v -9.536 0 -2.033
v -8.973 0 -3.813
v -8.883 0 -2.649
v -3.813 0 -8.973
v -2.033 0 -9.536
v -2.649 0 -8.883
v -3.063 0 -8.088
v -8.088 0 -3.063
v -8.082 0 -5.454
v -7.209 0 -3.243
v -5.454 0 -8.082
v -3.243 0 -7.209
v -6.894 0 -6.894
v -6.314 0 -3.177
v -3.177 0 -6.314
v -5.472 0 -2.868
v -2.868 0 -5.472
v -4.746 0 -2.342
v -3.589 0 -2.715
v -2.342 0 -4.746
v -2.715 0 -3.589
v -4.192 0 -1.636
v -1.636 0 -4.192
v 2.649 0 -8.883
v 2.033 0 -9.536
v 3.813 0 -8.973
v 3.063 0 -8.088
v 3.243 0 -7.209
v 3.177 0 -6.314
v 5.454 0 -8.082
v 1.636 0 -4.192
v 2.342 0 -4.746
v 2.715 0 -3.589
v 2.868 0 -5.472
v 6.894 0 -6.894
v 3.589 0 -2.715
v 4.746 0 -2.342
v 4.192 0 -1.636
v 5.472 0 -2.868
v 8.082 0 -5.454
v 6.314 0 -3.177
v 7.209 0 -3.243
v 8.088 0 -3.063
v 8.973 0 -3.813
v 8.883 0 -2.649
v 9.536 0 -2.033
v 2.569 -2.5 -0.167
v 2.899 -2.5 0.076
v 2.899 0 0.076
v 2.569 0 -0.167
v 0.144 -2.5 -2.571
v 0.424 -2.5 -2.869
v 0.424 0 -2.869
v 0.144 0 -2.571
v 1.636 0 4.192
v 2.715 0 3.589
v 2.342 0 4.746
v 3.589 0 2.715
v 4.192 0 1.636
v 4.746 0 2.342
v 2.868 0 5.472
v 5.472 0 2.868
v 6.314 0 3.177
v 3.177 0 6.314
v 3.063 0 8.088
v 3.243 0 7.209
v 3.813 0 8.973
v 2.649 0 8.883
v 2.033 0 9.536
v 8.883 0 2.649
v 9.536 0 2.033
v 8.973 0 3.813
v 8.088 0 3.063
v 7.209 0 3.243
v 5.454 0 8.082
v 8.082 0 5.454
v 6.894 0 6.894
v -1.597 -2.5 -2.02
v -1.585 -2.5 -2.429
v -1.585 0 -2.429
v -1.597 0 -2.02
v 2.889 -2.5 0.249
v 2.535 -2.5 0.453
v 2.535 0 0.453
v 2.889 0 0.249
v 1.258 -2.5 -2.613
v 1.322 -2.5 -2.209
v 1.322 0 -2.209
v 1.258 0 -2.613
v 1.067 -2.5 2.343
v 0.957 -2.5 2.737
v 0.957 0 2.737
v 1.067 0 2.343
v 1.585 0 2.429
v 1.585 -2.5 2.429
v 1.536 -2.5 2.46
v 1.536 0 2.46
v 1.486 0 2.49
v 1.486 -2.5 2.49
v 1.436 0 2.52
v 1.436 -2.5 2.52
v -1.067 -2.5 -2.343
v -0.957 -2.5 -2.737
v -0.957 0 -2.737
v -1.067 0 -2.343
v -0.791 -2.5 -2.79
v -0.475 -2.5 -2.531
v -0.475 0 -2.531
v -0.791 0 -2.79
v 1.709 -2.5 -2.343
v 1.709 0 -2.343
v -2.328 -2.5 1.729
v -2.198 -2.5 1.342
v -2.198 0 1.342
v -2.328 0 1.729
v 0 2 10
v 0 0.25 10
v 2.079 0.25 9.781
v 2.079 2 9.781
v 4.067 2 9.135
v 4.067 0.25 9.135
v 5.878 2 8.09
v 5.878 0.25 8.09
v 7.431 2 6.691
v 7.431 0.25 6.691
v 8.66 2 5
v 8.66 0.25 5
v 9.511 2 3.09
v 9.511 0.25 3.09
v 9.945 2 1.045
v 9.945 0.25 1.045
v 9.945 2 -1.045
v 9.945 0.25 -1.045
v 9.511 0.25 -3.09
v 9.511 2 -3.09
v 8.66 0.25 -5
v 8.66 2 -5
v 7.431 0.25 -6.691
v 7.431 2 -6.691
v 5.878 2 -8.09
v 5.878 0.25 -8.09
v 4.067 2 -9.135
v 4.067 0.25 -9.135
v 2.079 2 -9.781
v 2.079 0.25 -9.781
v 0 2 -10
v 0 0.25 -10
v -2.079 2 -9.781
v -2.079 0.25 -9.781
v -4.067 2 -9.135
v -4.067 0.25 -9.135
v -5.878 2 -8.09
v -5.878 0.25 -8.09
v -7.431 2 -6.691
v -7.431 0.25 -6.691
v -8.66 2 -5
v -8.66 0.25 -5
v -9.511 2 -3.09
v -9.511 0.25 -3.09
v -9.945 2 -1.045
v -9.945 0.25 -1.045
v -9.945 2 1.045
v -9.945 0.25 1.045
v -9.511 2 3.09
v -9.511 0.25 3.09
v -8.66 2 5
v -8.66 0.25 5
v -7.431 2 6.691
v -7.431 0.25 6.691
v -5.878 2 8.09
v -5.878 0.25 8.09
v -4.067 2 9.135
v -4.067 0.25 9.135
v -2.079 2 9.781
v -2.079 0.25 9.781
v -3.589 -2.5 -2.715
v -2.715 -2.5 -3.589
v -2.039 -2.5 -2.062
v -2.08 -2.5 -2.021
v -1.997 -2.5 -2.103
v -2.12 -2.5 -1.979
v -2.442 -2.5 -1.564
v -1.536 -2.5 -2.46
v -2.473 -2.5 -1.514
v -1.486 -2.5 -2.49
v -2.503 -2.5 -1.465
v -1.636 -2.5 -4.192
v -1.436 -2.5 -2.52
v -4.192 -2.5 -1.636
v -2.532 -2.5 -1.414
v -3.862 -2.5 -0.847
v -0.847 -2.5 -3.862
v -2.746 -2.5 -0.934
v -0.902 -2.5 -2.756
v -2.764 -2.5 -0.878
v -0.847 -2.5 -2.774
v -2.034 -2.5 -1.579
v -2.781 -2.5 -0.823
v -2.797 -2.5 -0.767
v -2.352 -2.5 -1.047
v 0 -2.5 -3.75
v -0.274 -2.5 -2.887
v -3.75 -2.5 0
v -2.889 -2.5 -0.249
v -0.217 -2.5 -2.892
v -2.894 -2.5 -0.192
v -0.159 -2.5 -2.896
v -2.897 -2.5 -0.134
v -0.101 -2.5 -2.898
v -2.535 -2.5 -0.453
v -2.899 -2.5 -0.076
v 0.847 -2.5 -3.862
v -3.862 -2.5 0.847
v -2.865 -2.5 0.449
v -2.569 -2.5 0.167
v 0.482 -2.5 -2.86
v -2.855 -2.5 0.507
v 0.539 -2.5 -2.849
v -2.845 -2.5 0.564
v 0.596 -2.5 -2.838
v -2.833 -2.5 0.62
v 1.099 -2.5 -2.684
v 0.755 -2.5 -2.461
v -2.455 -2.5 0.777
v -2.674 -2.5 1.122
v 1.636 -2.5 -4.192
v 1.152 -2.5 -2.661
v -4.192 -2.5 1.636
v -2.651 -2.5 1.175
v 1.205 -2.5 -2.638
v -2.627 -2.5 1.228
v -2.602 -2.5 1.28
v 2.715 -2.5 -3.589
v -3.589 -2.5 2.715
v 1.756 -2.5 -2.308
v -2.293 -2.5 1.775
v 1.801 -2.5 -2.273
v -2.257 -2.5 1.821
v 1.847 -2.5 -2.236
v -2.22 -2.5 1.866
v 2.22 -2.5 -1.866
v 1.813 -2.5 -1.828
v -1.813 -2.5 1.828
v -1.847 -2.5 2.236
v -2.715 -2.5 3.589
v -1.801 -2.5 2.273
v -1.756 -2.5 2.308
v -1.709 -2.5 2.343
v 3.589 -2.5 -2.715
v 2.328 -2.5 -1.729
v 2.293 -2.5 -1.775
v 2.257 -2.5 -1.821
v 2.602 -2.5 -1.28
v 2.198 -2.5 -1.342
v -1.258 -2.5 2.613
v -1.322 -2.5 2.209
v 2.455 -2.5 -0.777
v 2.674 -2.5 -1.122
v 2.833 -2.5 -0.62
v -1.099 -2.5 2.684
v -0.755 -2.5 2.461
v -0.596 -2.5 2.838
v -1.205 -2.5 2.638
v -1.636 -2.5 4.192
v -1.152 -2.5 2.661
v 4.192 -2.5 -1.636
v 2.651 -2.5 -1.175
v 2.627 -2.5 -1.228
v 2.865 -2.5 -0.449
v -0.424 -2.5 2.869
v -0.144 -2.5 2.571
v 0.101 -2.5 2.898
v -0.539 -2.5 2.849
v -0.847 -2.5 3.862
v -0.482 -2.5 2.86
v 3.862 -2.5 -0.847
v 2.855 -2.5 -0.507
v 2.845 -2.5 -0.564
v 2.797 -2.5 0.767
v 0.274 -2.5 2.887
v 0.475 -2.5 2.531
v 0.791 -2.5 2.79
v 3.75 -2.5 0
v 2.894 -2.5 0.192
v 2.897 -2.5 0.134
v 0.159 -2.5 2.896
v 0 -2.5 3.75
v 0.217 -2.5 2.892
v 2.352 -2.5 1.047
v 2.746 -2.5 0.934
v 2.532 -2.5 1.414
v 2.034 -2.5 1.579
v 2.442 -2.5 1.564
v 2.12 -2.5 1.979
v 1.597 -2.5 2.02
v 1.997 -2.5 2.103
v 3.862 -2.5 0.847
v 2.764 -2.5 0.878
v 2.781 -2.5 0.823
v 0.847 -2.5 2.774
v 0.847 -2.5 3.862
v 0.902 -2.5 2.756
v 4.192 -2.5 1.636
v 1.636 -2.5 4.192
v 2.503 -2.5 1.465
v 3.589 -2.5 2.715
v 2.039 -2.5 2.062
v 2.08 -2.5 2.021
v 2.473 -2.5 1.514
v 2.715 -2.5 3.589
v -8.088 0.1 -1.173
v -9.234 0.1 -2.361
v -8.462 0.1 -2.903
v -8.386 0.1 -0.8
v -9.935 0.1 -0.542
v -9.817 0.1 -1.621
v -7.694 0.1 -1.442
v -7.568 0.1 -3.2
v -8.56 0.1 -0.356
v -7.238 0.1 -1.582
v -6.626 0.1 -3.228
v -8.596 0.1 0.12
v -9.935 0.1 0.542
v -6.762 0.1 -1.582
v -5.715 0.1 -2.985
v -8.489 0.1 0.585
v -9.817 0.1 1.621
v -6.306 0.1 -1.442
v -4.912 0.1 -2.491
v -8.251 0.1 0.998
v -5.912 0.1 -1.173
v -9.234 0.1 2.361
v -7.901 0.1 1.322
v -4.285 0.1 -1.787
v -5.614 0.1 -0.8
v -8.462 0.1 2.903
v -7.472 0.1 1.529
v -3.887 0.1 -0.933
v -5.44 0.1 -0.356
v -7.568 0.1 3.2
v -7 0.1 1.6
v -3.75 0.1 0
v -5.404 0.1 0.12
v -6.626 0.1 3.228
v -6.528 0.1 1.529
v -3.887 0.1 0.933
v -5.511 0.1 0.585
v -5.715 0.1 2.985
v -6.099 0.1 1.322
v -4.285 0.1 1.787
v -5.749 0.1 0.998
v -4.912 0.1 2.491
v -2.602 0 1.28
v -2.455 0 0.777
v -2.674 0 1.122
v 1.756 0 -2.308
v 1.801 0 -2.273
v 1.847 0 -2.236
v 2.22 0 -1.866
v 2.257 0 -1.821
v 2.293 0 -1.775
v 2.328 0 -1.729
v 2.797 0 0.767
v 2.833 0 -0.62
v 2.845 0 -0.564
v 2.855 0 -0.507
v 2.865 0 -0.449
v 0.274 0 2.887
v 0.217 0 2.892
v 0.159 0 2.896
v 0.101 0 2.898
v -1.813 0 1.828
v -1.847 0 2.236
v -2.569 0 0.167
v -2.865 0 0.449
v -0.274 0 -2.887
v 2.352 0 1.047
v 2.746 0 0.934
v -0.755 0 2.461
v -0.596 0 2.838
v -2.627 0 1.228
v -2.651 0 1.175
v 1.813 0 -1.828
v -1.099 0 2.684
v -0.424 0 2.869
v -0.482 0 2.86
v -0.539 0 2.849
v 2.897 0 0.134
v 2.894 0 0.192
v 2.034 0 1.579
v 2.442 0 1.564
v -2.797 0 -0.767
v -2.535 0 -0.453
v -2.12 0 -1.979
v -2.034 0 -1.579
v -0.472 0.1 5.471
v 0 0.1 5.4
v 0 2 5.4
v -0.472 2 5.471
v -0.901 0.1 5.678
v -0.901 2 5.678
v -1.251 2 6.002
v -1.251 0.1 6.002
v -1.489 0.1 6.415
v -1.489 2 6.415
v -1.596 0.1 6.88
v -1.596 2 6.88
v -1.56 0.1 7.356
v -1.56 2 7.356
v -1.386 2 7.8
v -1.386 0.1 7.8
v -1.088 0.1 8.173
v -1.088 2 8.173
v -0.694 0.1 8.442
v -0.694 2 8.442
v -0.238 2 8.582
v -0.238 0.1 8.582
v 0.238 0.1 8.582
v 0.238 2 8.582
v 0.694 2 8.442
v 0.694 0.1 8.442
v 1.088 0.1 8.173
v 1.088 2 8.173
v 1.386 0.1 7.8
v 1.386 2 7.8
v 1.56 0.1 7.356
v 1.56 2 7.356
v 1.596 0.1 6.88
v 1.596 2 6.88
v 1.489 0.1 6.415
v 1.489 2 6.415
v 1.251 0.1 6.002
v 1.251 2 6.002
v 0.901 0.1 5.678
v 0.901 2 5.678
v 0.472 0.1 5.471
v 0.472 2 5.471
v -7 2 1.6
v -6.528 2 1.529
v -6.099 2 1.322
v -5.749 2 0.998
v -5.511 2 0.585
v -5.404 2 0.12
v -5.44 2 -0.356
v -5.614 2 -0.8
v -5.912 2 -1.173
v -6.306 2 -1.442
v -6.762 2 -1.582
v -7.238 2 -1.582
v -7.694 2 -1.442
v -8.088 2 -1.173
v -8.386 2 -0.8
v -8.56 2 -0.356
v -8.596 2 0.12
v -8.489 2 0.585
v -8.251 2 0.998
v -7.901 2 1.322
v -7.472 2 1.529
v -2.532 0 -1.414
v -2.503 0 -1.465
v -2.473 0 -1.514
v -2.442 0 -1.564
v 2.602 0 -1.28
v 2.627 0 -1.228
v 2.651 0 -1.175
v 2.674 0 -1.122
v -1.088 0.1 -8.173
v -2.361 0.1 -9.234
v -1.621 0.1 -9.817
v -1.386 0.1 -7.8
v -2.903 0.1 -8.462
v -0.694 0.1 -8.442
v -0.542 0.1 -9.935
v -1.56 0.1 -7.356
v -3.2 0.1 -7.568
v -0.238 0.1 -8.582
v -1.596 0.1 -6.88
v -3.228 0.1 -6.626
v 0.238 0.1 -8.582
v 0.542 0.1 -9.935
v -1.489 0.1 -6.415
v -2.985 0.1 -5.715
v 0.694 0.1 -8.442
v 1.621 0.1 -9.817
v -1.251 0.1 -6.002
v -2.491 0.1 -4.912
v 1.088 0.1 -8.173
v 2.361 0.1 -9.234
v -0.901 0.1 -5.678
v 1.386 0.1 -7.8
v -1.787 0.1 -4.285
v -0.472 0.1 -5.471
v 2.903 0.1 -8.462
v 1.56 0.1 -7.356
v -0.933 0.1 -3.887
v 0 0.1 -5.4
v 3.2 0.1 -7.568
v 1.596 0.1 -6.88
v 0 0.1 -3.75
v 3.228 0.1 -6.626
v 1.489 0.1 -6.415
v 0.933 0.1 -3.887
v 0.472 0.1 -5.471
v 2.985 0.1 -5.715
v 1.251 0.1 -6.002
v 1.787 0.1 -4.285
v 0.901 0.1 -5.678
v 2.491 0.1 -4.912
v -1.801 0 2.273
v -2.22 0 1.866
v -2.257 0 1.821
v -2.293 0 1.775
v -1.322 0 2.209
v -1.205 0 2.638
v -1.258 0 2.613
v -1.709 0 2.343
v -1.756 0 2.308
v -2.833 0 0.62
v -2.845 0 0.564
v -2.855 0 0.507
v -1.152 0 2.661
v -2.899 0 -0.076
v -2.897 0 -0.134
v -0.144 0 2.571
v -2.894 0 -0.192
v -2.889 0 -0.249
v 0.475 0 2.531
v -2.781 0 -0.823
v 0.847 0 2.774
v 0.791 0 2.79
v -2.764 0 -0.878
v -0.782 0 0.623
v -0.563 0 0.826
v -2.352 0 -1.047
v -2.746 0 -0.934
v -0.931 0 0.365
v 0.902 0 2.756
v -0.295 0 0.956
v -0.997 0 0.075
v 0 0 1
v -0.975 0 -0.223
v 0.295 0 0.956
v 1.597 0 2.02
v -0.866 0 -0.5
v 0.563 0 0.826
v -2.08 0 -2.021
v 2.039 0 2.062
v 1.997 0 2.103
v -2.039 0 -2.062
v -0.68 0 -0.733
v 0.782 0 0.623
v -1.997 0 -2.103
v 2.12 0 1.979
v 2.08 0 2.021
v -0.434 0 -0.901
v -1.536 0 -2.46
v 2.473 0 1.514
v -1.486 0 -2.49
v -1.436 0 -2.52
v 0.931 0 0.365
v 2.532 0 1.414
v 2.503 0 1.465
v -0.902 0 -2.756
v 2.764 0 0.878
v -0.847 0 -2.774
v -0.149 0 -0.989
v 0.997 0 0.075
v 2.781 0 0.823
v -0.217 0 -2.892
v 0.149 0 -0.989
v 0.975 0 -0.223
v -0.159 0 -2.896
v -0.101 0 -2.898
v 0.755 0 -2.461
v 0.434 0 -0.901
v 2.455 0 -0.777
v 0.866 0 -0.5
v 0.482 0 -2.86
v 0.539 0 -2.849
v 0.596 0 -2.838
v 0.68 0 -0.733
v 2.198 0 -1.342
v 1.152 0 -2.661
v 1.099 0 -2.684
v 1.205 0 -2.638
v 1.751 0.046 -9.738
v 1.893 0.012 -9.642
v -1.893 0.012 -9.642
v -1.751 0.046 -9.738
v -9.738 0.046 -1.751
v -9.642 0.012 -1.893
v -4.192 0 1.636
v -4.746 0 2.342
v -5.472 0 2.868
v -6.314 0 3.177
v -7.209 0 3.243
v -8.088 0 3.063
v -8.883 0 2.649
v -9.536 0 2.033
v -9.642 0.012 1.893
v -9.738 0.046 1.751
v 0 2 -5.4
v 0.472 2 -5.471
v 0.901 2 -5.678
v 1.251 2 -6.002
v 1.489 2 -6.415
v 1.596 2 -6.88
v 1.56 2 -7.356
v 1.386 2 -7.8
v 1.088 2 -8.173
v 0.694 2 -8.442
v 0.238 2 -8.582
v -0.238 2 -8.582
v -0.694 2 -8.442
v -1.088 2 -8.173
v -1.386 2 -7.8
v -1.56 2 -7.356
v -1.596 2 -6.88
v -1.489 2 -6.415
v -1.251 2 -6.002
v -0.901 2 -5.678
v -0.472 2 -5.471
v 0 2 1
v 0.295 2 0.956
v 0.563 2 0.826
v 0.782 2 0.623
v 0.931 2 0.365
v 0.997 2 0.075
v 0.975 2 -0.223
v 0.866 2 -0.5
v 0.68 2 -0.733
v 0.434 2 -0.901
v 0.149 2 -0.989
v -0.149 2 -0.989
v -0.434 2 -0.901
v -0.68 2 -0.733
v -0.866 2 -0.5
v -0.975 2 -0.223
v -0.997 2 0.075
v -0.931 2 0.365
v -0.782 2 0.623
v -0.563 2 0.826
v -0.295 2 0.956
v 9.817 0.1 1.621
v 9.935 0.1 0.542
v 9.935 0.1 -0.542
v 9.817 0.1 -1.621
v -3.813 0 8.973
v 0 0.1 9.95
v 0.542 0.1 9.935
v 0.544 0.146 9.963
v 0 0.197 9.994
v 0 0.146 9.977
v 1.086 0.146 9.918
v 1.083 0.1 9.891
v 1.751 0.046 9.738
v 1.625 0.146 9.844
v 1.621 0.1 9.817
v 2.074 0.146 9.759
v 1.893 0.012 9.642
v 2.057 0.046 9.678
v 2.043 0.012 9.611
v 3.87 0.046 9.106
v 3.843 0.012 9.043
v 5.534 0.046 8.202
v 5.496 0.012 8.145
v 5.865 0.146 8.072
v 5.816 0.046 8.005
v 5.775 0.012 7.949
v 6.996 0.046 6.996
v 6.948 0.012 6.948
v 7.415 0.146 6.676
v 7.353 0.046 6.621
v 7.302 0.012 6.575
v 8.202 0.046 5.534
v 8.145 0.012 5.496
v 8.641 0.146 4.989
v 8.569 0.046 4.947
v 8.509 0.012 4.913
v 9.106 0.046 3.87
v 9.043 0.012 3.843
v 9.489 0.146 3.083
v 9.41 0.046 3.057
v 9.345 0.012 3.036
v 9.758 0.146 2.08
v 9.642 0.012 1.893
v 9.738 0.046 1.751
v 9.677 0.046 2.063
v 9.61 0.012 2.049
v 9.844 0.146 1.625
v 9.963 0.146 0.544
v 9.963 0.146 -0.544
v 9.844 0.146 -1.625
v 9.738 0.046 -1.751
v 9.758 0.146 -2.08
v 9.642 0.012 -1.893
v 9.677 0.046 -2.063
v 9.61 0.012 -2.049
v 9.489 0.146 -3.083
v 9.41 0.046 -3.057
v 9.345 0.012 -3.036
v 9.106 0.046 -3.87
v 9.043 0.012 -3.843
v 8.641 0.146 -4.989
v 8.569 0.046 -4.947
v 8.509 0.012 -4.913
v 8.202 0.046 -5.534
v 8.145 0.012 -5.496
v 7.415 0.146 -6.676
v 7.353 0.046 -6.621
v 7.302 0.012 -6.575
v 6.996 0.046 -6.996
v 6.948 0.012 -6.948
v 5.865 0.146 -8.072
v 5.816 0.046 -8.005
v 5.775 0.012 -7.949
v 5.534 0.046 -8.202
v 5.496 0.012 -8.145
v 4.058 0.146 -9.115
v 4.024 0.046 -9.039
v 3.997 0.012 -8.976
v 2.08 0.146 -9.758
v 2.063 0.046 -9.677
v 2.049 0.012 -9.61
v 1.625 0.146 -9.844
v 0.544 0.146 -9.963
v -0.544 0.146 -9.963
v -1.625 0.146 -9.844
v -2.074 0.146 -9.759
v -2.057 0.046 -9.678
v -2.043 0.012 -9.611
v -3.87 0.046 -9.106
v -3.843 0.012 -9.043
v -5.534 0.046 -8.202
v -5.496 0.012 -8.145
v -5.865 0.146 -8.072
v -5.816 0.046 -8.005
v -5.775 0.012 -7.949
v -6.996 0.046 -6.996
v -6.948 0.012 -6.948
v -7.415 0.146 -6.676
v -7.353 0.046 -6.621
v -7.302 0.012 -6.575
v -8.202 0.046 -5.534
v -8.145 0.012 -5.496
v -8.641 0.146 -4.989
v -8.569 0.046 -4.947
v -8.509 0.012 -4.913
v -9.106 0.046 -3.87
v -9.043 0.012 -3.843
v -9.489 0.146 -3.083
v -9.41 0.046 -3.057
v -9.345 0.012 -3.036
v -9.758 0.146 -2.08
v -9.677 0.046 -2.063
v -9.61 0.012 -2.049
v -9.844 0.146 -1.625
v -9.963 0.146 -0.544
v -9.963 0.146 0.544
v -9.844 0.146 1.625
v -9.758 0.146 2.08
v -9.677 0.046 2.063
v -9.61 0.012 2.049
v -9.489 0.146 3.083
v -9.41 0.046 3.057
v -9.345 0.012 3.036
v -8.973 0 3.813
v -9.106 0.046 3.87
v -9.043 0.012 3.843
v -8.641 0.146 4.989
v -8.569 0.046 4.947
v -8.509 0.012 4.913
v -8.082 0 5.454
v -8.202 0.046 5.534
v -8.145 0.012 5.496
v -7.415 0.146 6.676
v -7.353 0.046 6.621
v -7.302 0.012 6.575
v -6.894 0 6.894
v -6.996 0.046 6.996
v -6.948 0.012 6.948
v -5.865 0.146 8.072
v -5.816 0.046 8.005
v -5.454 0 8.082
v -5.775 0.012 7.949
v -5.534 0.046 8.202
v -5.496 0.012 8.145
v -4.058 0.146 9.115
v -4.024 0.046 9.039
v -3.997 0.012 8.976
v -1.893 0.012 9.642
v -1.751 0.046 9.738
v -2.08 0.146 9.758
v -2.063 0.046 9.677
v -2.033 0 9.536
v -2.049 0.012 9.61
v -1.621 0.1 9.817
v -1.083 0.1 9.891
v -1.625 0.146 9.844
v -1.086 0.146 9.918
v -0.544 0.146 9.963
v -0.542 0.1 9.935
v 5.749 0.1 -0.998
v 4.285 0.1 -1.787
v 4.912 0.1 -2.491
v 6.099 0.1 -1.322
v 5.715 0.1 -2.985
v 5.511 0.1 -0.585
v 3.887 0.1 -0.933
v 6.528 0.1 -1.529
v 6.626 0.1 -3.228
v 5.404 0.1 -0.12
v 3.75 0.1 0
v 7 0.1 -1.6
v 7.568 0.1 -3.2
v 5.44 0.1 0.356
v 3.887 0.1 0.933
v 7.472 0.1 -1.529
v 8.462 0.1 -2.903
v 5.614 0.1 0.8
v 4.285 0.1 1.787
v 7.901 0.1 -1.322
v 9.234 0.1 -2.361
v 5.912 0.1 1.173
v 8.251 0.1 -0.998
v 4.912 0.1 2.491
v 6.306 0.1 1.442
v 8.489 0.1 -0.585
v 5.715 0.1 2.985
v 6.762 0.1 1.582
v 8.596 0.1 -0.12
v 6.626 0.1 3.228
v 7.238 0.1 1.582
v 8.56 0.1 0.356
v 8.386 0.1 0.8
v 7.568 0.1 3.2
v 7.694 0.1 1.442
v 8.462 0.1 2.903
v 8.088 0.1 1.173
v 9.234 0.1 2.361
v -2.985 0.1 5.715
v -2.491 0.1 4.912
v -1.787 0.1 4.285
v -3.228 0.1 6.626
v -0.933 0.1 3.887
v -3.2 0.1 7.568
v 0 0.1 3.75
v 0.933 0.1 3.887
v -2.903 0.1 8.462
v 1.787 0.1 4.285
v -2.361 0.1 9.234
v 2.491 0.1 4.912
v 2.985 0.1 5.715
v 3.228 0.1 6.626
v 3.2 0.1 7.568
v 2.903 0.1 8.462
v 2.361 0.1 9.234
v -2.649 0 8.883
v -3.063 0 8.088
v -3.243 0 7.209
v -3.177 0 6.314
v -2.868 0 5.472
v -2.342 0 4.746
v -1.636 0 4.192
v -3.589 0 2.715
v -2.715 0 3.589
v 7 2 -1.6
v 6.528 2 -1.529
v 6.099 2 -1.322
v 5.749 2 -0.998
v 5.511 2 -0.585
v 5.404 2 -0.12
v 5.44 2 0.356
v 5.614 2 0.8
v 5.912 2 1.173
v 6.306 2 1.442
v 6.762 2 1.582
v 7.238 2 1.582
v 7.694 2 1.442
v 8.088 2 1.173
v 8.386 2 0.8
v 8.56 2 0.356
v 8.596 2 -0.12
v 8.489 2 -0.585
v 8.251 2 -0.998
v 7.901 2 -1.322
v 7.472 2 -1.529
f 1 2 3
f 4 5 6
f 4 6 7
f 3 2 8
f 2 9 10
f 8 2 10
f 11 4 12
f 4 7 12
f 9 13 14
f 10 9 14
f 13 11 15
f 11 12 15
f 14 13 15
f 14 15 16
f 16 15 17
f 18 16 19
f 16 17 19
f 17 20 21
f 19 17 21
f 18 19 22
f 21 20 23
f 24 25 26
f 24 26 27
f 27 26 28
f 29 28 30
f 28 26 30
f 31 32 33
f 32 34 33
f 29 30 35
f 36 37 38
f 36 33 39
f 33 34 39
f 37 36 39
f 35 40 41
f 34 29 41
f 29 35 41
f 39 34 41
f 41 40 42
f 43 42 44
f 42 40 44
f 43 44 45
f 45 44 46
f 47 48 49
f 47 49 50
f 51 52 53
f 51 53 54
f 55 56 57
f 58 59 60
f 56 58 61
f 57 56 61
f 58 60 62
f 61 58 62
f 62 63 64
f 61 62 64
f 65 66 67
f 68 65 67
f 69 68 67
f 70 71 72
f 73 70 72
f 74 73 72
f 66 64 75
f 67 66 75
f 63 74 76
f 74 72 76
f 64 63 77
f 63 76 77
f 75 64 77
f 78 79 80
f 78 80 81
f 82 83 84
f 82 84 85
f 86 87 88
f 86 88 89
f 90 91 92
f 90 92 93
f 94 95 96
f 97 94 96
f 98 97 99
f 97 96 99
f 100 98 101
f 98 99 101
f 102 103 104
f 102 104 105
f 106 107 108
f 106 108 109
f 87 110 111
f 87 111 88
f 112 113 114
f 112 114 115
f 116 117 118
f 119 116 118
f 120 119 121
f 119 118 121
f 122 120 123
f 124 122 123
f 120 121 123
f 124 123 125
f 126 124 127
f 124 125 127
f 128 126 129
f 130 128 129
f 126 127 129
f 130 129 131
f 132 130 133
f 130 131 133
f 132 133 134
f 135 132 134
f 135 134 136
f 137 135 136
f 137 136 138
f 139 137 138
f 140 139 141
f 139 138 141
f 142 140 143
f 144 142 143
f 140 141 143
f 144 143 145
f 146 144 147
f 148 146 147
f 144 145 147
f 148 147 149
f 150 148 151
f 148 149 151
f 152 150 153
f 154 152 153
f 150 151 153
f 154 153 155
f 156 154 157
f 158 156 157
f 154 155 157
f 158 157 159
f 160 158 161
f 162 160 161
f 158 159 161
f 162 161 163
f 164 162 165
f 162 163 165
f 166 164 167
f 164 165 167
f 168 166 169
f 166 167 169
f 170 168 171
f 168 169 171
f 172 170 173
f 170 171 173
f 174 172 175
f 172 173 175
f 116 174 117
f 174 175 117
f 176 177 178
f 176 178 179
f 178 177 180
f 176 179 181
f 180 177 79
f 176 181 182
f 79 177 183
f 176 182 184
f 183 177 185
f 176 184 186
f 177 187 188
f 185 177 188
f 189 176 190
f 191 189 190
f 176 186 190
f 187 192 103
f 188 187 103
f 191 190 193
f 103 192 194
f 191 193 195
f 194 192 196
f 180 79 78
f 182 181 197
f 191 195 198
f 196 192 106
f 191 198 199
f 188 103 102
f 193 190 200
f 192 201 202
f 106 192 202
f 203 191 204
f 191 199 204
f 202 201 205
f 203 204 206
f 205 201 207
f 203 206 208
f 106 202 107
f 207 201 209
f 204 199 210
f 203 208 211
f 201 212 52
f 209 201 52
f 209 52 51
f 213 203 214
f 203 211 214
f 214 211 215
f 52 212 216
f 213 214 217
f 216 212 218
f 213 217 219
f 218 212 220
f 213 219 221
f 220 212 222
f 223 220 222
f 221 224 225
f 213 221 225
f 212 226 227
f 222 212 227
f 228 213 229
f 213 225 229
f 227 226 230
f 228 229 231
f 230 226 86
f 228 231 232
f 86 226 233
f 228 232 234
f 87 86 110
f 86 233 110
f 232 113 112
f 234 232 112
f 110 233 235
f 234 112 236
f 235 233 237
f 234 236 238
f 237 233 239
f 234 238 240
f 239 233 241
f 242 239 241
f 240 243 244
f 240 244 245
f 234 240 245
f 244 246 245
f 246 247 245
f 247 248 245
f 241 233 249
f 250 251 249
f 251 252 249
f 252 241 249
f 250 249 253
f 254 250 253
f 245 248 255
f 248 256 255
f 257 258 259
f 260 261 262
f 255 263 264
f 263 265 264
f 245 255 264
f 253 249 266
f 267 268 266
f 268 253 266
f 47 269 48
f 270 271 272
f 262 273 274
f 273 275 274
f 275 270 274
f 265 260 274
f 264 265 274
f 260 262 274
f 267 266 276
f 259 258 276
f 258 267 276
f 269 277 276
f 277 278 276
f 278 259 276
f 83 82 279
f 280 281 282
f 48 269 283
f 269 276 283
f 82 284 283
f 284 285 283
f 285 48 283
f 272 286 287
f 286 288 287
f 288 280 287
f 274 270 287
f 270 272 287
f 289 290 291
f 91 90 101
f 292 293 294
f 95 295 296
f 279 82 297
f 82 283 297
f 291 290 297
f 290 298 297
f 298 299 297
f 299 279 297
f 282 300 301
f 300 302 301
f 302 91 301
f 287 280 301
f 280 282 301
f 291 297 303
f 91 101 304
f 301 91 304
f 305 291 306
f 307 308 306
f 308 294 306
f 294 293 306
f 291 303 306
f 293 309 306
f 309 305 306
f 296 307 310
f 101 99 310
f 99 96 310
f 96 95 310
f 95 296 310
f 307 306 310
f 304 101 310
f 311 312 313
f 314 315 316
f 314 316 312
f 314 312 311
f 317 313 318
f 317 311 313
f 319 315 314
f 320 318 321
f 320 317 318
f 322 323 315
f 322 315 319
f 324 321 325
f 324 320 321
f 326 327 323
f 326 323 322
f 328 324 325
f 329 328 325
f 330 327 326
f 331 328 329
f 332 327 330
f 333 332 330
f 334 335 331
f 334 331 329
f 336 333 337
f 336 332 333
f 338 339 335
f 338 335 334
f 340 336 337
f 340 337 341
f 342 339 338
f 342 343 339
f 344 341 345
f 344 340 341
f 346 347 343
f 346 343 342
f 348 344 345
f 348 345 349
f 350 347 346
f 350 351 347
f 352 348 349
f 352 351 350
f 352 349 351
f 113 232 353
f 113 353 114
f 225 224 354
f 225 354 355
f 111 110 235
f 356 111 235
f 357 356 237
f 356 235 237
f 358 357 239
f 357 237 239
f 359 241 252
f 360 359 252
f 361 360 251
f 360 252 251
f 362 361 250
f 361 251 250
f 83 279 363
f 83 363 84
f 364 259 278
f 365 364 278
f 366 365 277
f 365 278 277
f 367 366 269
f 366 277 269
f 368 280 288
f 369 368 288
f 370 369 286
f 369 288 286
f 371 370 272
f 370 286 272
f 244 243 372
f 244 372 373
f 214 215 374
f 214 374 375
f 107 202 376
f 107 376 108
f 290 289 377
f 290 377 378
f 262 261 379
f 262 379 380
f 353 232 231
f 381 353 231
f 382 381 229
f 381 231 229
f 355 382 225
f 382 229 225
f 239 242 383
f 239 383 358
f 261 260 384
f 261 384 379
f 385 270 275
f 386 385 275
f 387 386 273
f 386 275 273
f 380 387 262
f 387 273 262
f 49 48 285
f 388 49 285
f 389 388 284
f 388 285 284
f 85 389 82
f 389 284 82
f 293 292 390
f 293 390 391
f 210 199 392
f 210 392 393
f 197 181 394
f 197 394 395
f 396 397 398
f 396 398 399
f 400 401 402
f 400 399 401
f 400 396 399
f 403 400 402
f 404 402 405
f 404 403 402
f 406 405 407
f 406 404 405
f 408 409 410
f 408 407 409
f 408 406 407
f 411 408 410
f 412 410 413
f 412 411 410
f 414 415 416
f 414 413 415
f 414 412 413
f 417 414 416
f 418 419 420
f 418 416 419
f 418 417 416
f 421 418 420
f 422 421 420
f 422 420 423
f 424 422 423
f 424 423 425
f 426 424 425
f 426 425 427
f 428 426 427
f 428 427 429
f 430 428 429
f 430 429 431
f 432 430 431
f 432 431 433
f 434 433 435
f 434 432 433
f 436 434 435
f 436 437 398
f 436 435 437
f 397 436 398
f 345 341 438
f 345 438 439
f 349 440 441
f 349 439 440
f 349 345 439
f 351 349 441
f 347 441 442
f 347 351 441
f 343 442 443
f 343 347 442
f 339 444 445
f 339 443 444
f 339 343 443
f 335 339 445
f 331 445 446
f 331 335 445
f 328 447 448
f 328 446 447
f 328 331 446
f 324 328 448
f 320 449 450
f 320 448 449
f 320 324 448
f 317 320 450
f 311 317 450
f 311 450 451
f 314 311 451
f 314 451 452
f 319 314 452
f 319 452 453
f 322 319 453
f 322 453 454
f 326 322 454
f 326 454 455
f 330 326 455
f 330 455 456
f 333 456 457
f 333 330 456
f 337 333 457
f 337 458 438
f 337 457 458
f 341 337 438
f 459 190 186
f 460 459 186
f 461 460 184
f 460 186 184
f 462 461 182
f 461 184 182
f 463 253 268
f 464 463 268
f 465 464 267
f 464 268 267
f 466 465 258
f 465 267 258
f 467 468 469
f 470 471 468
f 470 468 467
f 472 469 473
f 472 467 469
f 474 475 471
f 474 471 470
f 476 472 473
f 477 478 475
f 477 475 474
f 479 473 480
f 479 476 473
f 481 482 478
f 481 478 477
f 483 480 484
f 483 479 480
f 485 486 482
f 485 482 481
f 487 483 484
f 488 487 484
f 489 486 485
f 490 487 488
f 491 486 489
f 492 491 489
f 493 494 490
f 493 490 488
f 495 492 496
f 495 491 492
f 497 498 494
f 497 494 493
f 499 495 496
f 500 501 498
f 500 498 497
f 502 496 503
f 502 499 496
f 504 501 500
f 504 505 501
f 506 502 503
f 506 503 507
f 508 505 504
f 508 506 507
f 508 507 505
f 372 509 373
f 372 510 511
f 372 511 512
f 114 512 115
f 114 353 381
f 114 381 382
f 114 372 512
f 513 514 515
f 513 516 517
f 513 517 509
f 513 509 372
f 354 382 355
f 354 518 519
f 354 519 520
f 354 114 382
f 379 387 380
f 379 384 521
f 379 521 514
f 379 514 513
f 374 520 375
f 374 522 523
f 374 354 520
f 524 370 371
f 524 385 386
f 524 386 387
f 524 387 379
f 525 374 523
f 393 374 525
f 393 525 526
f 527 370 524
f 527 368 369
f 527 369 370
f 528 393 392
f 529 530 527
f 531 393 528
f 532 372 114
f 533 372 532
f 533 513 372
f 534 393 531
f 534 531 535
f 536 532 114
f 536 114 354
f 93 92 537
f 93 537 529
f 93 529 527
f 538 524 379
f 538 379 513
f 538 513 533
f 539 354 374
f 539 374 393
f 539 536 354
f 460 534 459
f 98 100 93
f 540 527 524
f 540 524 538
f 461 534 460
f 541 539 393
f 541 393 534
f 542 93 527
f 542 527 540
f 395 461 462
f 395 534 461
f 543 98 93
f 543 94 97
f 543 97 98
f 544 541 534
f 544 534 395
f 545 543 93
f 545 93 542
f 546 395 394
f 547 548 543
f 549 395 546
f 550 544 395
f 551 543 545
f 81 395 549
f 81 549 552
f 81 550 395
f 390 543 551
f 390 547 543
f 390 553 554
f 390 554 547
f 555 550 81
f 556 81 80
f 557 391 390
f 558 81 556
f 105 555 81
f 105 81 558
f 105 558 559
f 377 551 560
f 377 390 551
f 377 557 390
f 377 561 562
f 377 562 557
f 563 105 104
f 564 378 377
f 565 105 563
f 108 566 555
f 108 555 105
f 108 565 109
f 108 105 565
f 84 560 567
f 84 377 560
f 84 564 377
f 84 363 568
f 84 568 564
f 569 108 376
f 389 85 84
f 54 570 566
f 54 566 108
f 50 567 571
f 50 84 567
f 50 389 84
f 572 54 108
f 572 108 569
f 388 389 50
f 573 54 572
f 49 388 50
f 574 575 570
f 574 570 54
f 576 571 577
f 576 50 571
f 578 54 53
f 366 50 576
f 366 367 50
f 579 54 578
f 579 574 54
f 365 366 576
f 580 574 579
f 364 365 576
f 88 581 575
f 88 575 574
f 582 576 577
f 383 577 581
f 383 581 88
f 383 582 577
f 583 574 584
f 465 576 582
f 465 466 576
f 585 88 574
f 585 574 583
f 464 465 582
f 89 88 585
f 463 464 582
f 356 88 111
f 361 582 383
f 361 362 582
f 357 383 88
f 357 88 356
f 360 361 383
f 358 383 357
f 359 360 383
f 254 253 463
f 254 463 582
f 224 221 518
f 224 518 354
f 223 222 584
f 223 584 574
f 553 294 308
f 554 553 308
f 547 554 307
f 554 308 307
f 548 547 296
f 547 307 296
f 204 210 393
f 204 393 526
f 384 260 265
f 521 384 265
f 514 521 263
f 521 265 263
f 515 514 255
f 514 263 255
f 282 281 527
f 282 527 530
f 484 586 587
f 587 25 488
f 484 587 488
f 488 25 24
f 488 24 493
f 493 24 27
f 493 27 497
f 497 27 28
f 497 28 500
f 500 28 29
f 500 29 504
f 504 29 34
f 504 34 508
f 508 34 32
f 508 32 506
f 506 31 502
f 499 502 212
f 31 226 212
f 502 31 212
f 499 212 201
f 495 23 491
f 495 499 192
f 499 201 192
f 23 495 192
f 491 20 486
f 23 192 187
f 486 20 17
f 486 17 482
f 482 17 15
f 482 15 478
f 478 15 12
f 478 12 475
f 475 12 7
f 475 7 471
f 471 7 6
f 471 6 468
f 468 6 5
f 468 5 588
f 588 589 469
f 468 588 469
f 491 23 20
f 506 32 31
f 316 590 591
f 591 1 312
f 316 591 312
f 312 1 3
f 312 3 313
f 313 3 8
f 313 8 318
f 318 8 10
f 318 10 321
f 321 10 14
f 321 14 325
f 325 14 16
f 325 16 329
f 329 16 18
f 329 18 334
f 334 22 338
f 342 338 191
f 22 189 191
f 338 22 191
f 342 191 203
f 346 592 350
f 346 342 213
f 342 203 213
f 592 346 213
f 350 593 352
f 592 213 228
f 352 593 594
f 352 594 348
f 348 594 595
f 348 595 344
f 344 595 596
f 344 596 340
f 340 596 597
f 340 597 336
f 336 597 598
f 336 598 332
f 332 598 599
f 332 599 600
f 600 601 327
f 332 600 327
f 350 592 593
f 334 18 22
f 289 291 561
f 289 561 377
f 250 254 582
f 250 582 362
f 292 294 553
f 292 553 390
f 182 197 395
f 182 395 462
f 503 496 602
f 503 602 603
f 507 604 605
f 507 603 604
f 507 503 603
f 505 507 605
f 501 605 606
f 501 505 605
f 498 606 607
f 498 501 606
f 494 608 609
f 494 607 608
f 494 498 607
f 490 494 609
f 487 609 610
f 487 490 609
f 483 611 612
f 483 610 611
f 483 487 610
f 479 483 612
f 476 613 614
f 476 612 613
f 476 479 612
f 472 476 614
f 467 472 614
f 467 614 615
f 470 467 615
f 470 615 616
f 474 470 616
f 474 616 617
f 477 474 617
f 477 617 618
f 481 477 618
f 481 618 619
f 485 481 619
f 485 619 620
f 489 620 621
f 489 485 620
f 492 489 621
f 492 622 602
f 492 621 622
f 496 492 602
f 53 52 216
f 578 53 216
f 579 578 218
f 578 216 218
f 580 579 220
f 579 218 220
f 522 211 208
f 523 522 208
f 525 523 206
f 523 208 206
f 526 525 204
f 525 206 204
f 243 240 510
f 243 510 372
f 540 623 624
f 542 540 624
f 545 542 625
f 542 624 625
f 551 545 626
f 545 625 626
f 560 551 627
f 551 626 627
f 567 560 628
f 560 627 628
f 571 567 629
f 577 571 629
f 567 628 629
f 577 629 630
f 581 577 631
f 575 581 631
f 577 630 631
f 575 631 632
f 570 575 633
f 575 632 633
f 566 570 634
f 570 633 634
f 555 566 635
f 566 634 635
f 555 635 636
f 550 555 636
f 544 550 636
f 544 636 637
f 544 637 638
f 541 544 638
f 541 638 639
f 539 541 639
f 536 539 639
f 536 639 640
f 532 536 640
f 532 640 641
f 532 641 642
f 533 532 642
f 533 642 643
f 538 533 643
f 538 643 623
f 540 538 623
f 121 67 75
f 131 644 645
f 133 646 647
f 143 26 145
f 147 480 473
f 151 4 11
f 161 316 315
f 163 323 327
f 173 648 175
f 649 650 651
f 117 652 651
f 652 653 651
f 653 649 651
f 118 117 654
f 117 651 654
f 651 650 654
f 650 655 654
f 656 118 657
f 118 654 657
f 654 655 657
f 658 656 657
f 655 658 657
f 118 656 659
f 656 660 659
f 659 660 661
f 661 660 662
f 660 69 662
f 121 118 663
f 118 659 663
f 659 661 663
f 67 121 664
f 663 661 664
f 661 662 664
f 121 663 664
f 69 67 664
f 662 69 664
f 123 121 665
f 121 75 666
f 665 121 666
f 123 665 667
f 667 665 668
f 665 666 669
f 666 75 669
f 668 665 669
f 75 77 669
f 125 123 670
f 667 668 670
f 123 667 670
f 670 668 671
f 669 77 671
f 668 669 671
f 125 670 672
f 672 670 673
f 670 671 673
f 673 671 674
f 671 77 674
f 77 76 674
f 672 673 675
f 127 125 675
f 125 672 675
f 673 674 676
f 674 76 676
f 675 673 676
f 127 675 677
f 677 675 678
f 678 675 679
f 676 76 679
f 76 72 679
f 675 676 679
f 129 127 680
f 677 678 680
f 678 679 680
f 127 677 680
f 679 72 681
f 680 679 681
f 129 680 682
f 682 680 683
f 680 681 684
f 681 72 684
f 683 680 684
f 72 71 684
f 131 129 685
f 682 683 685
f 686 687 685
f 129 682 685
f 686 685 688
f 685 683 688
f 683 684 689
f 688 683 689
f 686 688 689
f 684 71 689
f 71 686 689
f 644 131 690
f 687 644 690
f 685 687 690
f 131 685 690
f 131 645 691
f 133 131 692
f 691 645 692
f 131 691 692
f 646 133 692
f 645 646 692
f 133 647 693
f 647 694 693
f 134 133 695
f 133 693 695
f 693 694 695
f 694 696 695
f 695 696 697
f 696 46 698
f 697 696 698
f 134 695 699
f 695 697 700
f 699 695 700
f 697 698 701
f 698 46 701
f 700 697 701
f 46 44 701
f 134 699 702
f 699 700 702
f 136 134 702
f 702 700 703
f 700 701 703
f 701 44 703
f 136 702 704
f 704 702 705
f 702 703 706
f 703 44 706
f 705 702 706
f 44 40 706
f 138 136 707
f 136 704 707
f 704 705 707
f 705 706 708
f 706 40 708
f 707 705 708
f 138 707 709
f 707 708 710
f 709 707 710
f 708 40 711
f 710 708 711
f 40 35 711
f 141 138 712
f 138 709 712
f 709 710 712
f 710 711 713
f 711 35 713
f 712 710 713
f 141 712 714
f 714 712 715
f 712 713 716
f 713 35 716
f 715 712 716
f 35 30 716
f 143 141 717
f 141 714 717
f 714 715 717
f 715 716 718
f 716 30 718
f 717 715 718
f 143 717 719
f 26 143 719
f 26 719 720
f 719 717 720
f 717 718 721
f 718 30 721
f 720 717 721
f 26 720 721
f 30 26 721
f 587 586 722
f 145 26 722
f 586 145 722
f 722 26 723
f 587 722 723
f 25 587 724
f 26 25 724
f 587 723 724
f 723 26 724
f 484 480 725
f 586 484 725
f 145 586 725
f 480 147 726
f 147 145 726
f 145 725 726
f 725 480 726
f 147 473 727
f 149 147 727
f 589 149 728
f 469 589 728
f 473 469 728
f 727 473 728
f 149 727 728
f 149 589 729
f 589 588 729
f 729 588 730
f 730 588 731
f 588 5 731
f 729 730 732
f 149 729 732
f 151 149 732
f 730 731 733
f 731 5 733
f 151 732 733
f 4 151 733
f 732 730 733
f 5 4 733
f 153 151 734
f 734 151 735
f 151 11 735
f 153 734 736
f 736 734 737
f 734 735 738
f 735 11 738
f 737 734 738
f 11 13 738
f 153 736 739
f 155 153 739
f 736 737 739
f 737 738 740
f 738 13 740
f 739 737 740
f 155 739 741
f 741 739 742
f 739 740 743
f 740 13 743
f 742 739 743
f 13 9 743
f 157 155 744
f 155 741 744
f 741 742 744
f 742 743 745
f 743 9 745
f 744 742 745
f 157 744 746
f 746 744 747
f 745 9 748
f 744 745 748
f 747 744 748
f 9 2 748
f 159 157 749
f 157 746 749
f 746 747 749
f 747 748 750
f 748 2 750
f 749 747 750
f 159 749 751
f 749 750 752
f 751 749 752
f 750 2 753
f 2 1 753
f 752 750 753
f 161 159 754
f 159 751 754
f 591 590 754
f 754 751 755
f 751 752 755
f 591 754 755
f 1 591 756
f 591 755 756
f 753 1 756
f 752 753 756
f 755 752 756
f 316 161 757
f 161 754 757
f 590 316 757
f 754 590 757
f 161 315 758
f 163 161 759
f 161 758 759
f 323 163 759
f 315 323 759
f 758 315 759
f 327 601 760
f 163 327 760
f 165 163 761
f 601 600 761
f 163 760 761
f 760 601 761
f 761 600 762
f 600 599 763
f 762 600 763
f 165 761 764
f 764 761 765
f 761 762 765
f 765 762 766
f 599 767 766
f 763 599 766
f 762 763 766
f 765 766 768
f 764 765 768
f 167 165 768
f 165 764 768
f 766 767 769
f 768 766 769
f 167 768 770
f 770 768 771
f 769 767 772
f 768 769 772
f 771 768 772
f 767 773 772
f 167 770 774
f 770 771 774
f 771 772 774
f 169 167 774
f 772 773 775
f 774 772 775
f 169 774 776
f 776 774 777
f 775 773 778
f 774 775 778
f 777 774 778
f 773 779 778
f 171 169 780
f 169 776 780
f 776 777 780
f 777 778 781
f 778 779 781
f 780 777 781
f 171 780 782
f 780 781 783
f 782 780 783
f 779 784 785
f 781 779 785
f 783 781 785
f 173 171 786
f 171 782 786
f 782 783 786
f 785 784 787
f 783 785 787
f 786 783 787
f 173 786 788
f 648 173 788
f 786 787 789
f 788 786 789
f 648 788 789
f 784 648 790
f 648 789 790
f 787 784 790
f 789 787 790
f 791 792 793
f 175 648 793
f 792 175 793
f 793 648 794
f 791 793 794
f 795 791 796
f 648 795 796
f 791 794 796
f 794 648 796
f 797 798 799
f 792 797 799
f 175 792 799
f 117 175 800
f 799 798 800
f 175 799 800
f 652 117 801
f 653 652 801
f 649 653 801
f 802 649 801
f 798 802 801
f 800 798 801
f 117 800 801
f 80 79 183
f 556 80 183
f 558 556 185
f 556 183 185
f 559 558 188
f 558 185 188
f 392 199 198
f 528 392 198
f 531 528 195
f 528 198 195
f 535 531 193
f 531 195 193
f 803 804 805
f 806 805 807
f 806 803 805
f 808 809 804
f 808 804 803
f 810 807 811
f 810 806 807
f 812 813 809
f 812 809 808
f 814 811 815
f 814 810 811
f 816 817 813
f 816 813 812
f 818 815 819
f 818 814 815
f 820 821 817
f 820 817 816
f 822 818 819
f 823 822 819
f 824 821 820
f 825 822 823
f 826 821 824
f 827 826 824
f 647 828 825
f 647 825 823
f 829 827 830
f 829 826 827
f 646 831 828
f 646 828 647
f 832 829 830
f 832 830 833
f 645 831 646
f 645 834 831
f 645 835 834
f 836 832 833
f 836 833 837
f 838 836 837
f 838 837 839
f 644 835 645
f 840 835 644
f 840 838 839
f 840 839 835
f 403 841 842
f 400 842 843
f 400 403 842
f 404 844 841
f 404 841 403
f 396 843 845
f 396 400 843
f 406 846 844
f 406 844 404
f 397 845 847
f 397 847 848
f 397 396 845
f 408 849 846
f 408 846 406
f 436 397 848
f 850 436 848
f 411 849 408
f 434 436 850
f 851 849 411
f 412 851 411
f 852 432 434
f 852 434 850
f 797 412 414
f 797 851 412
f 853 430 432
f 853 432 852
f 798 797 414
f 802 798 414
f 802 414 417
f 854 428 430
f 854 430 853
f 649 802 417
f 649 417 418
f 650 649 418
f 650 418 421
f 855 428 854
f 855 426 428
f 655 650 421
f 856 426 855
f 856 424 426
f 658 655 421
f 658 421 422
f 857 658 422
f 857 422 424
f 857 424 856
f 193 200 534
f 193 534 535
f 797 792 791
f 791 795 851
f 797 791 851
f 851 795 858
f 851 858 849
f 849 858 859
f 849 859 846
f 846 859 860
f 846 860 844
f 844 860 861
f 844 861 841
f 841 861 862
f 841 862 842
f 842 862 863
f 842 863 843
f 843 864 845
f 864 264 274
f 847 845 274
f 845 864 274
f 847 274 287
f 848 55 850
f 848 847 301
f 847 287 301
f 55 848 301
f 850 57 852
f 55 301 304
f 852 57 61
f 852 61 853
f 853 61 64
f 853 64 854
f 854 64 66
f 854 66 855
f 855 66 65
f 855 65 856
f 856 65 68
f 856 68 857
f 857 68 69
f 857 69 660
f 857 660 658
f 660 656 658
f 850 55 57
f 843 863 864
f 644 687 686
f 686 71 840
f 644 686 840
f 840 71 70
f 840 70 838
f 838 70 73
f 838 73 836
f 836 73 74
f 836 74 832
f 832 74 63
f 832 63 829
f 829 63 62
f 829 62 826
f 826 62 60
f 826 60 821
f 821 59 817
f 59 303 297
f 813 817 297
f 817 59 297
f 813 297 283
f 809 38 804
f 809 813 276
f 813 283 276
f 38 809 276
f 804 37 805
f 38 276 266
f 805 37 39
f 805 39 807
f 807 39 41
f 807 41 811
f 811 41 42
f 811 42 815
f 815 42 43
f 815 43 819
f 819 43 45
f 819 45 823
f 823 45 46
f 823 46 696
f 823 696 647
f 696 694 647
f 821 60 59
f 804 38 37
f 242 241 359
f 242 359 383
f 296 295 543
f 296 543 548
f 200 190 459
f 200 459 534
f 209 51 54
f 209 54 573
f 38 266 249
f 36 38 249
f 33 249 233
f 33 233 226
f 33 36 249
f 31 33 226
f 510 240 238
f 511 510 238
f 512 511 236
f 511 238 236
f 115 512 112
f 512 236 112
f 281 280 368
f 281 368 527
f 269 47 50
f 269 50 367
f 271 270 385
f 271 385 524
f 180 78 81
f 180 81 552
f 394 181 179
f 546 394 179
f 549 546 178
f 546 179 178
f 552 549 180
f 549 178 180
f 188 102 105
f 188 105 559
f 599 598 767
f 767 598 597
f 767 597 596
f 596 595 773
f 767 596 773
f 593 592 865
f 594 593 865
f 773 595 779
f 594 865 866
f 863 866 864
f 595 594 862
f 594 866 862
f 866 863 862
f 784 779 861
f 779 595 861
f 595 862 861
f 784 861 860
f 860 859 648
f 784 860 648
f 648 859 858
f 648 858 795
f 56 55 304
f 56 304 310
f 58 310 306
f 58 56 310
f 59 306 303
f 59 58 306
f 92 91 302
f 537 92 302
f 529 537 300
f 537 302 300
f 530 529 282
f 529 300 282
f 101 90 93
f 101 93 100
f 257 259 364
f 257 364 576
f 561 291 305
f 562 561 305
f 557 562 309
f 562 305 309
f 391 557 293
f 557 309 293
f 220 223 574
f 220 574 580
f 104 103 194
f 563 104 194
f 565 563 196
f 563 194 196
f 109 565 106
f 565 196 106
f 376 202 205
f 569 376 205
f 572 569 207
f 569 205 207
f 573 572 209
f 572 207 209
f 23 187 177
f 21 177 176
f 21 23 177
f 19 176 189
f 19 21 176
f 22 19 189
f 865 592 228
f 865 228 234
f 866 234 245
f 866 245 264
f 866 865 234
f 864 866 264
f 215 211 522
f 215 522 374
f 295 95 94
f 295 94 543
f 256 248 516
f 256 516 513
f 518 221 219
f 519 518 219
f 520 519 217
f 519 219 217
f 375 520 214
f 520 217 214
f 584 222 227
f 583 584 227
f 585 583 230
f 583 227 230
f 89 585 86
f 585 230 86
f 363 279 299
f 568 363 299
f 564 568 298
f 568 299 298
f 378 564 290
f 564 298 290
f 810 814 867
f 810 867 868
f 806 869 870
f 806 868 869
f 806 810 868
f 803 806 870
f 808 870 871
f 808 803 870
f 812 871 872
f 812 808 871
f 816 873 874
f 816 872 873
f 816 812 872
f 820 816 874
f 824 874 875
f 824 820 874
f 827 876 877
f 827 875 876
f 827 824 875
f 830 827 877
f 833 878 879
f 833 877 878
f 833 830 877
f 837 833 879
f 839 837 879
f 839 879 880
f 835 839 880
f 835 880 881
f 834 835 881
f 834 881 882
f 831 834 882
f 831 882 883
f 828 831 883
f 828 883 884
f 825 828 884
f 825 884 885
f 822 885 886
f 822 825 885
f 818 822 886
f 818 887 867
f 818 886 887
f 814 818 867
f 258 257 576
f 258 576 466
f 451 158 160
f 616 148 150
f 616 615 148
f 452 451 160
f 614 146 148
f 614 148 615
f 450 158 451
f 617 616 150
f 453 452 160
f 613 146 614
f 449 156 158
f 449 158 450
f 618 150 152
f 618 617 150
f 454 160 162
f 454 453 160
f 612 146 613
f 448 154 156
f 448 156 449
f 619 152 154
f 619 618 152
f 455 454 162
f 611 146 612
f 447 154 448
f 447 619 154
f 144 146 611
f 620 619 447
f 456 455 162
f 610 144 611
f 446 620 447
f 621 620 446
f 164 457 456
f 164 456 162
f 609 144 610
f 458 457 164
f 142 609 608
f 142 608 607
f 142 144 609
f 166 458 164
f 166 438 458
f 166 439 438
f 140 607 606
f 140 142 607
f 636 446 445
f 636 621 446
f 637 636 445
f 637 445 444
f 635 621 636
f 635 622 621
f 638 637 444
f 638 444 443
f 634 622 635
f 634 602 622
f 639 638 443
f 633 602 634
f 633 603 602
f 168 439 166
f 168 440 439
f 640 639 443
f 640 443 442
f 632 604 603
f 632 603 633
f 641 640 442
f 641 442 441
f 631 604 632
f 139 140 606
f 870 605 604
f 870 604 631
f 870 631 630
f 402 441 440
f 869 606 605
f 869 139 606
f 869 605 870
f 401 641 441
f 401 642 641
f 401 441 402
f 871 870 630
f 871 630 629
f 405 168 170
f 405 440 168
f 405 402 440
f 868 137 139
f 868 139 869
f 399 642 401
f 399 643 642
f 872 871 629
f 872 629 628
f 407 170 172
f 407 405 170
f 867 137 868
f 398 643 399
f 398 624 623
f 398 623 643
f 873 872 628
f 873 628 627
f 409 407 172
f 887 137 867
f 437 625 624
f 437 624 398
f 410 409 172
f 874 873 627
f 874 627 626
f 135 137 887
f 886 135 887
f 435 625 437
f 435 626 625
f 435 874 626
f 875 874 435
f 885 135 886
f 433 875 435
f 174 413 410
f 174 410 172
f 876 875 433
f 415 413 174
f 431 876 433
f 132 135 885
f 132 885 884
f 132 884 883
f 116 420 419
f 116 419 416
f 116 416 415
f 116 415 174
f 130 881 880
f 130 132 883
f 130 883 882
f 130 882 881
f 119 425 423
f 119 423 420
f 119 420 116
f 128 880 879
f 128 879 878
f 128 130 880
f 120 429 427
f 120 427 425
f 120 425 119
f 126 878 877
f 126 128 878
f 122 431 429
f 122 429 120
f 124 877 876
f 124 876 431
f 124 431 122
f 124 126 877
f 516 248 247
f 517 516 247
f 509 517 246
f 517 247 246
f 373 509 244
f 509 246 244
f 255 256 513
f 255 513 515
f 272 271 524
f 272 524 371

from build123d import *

# Parameters (mm, degrees)
SKETCH1_R           = 10
BOSS_EXTRUDE1_DEPTH = 2
SKETCH2_R           = 4.5
BOSS_EXTRUDE2_DEPTH = 2.5
FILLET1_R           = 0.25
SKETCH6_R           = 1
CUT_EXTRUDE2_DEPTH  = 15.840822214
SKETCH7_R           = 2.9
CUT_EXTRUDE3_DEPTH  = 2.5
BOSS_EXTRUDE4_DEPTH = 2.5
CIRPATTERN1_COUNT   = 26
SKETCH3_R           = 1.6
CUT_EXTRUDE4_DEPTH  = 15.361406756
SKETCH9_R           = 3.25
CUT_EXTRUDE5_DEPTH  = 2.6


with BuildPart() as part:
    # Sketch1 → Boss-Extrude1 (new body)
    with BuildSketch(Plane(origin=(0, 0, 0), x_dir=(1, 0, 0), z_dir=(0, 1, 0))):
        with Locations(Location((0, 0, 0), (0, 0, 270))):
            Circle(SKETCH1_R)
    extrude(amount=BOSS_EXTRUDE1_DEPTH)

    # Sketch2 → Boss-Extrude2 (add)
    with BuildSketch(Plane(origin=(0, 0, 0), x_dir=(1, 0, 0), z_dir=(0, 1, 0))):
        with Locations(Location((0, 0, 0), (0, 0, 270))):
            Circle(SKETCH2_R)
    extrude(amount=-BOSS_EXTRUDE2_DEPTH)

    # Fillet1
    fillet1_edges = [part.edges().sort_by_distance(p)[0] for p in [
        (0, 0, -10),
    ]]
    fillet(fillet1_edges, radius=FILLET1_R)

    # Sketch6 → Cut-Extrude2 (cut, through all)
    with BuildSketch(Plane(origin=(0, 2, 0), x_dir=(1, 0, 0), z_dir=(0, 1, 0))):
        with Locations(Location((0, 0, 0), (0, 0, 270))):
            Circle(SKETCH6_R)
    extrude(amount=-CUT_EXTRUDE2_DEPTH, mode=Mode.SUBTRACT)

    # Sketch7 → Cut-Extrude3 (cut)
    with BuildSketch(Plane.XZ.offset(2.5)):
        with Locations(Location((0, 0, 0), (0, 0, 270))):
            Circle(SKETCH7_R)
    extrude(amount=-CUT_EXTRUDE3_DEPTH, mode=Mode.SUBTRACT)

    # Sketch8 → Boss-Extrude4 (add)
    with BuildSketch(Plane.XZ.offset(2.5)):
        with BuildLine():
            Line((-2.35244742, -1.046531787), (-2.745588284, -0.933672842))
            ThreePointArc((-2.745588284, -0.933672842), (-2.649635472, -1.178741646), (-2.531859978, -1.414102207))
            Line((-2.531859978, -1.414102207), (-2.35244742, -1.046531787))
        make_face()
    boss_extrude4 = extrude(amount=-BOSS_EXTRUDE4_DEPTH)

    # CirPattern1: Boss-Extrude4 ×26 about axis
    cirpattern1_axis = Axis((0, 0, 0), (0, 1, 0))
    for i in range(1, CIRPATTERN1_COUNT):
        add(boss_extrude4.rotate(cirpattern1_axis, i * 360 / CIRPATTERN1_COUNT))

    # Sketch3 → Cut-Extrude4 (cut, through all)
    with BuildSketch(Plane(origin=(0, 0, 0), x_dir=(1, 0, 0), z_dir=(0, 1, 0))):
        with Locations(Location((0, 7, 0), (0, 0, 270))):
            Circle(SKETCH3_R)
        with Locations(Location((-7, 0, 0), (0, 0, 270))):
            Circle(SKETCH3_R)
        with Locations(Location((0, -7, 0), (0, 0, 90))):
            Circle(SKETCH3_R)
        with Locations(Location((7, 0, 0), (0, 0, 90))):
            Circle(SKETCH3_R)
    extrude(amount=CUT_EXTRUDE4_DEPTH, mode=Mode.SUBTRACT)

    # Sketch9 → Cut-Extrude5 (cut)
    with BuildSketch(Plane.XZ.offset(2.5)):
        with Locations((7, 0)):
            Circle(SKETCH9_R)
        with Locations((0, -7)):
            Circle(SKETCH9_R)
        with Locations((-7, 0)):
            Circle(SKETCH9_R)
        with Locations((0, 7)):
            Circle(SKETCH9_R)
    extrude(amount=-CUT_EXTRUDE5_DEPTH, mode=Mode.SUBTRACT)


solid = part.part
